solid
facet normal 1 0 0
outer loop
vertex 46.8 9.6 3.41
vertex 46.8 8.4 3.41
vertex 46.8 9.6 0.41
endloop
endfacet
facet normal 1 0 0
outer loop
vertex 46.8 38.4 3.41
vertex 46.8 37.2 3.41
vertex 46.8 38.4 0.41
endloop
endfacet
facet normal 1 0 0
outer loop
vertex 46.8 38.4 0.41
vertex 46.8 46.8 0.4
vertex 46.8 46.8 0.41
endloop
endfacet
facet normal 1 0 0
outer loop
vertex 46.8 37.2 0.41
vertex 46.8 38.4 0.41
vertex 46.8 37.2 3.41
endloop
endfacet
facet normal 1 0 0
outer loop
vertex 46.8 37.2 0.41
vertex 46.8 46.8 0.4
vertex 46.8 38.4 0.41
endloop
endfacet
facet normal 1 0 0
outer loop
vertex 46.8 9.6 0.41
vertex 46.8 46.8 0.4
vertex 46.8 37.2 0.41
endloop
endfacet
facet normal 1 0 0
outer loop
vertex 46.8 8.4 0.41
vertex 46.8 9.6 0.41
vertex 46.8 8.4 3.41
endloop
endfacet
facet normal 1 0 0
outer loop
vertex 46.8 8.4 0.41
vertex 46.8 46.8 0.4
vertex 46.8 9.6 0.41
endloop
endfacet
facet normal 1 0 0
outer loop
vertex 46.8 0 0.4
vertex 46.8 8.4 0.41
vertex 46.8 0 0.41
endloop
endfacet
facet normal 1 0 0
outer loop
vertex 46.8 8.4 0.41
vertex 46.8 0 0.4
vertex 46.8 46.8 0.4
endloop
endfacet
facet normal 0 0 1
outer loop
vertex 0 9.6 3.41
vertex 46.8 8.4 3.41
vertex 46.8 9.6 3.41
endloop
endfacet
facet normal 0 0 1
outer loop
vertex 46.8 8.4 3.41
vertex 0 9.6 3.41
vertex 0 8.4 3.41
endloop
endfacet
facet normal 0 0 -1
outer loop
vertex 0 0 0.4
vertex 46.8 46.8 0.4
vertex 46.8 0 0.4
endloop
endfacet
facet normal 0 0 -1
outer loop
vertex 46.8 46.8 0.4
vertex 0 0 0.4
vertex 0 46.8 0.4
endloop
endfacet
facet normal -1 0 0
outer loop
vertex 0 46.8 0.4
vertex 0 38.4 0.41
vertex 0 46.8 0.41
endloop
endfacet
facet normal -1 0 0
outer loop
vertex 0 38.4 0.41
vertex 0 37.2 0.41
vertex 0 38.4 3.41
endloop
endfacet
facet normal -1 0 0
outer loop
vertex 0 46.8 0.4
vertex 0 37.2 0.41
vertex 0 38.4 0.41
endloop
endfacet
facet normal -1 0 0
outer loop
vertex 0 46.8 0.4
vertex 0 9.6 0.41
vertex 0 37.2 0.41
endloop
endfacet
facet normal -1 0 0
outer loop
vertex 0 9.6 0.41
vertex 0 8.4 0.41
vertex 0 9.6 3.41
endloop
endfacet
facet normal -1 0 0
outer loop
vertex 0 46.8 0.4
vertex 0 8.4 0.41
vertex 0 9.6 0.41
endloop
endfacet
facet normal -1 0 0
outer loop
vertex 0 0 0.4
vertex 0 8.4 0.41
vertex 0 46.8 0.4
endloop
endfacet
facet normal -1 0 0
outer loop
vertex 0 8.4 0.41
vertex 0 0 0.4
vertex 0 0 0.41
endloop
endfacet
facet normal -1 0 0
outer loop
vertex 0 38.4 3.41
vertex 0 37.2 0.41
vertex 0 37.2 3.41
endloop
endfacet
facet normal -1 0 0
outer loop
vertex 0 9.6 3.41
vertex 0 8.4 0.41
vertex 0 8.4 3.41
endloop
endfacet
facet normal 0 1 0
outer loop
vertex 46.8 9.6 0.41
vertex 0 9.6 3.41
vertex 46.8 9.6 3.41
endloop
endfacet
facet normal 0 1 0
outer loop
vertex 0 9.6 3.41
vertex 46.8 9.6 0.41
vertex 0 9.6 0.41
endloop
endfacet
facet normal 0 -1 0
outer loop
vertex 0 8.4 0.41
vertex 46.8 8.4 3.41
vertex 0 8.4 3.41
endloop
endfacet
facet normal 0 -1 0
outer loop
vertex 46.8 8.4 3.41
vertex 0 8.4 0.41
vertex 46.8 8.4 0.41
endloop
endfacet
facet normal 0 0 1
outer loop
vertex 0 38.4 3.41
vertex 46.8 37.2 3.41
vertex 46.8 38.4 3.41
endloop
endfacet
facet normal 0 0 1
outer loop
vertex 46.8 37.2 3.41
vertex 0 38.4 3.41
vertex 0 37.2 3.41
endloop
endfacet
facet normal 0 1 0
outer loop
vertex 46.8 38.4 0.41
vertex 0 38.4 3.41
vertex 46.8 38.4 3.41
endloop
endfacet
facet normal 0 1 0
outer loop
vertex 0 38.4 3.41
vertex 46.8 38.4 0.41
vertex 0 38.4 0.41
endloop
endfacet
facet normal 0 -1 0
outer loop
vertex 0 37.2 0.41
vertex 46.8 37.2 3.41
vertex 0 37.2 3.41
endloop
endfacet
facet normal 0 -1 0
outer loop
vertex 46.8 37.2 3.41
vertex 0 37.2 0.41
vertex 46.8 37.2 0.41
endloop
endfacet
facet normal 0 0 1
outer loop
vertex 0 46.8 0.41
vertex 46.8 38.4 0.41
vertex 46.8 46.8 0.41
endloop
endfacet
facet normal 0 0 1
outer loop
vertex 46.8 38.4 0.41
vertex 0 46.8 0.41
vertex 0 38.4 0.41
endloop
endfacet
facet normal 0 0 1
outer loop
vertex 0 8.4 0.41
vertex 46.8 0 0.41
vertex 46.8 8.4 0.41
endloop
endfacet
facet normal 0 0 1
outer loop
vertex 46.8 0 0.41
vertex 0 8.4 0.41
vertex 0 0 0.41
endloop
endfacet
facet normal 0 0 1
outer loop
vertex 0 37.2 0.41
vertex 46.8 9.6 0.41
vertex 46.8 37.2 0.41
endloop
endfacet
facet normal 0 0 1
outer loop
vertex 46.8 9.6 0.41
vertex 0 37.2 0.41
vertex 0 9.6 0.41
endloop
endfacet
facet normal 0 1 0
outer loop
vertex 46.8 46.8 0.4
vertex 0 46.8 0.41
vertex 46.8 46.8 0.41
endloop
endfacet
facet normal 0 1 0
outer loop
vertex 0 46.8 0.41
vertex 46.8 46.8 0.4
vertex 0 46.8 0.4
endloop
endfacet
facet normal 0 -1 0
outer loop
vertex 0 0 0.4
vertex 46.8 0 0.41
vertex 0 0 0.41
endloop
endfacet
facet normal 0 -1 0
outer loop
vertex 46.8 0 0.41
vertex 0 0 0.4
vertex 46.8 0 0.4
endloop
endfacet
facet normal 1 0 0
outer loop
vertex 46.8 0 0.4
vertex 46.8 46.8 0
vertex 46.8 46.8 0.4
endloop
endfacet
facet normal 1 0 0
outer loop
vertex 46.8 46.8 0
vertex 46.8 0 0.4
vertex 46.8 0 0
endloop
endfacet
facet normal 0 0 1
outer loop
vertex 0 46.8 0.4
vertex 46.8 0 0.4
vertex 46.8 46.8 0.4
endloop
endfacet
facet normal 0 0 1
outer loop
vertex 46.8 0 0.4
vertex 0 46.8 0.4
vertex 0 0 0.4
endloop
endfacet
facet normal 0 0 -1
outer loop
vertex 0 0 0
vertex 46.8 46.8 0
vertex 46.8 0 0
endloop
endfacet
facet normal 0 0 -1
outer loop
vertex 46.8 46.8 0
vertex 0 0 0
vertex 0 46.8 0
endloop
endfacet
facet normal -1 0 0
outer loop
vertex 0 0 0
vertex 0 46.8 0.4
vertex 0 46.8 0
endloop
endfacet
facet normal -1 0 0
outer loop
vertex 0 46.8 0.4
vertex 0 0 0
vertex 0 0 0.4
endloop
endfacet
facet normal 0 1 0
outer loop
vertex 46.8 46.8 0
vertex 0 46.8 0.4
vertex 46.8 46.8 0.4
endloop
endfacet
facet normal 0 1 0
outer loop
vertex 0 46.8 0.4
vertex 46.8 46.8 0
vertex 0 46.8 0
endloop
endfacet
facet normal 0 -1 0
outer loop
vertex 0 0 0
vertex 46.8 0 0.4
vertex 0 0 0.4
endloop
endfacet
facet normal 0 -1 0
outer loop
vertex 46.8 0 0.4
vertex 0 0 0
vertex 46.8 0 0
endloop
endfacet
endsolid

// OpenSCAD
// file: ../../Base/Helper.scad
// Fischertechnik Box Foundation
// Helper functions

include <PlacementOptions.scad>

// getRotation(rotations, i)
// gets the rotation with index i, even if rotations or rotations[i] is undefined.
// If undefined, NoRotation ist returned.
// rotations = list of Rotate-constants
// i = Index of the rotation
function getRotation(rotations, i) = (is_undef(rotations) || is_undef(rotations[i])) ? NoRotation : rotations[i];
// file: ../../Base/PlacementOptions.scad
// Fischertechnik Box Foundation
// Placement Options

// Alignment
NoAlign = 0;
AlignLeft = 1;
AlignBottom = 2;
AlignCenter = 3;
AlignRight = 4;
AlignTop = 5;

// Element rotation degree steps
rotations = [0, -90, -180, -270];

// Rotation
NoRotation = 0;
Rotate0 = 0;
Rotate90 = 1;
Rotate180 = 2;
Rotate270 = 3;

// Docking (seen from above)
NoDock = -1;
DockLeft = 0;
DockTop = 1;
DockRight = 2;
DockCorner = 2;
DockBottom = 3;

// Web corners
LowerLeft = 0;
UpperLeft = 1;
UpperRight = 2;
LowerRight = 3;

// Web position relative to corner
LeftOfCorner = 0;
RightOfCorner = 1;
// file: ../../Base/Boxes.scad
// Fischertechnik Box Foundation
// Pre-designed Boxes

use <Constants.scad>

include <PlacementOptions.scad>

box190Width = 190;
box190Depth = 130;
box130Width = 130;
box130Depth = 95;

// Values are from an original ec3 box
topBottomDifference = 1.5;
outerHeight = 40;
innerHeight = 38.2;
baseThickness = outerHeight - innerHeight;
stackExcess = 5.7;
radius = 3.5;
wallThickness = 1.5;
tolerance = 0.2;
stackOffset = innerHeight - stackExcess;

boxUsageHeight = stackOffset;
boxWallThickness = wallThickness;
boxBaseThickness = baseThickness;
boxWebWidth = 3.0;

// getBoxWallThickness()
// Gets the wall thickness of a Fischertechnik Box
function getBoxWallThickness() = boxWallThickness;

// getBoxUsageHeight()
// Gets the usable height of a Fischertechnik box
function getBoxUsageHeight() = boxUsageHeight;

// getBoxInnerHeight()
// Gets the inner height of a Fischertechnik box, including the stack excess
function getBoxInnerHeight() = innerHeight;

// getBoxBaseThickness()
// Gets the thickness of the Fischertechnik box base.
function getBoxBaseThickness() = boxBaseThickness;

// getBoxWebWidth()
// Gets the width of a box web
function getBoxWebWidth() = boxWebWidth;

// getBox190Space()
// Gets the usable inner space of a Box 190 as an x/y-list
function getBox190Space() = [
    box190Width - 2*getBoxWallThickness() - topBottomDifference, 
    box190Depth - 2*getBoxWallThickness() - topBottomDifference ];

// BoxBase(width, depth)
// Creates an empty stackable Fischertechnik compatible box
// width = Outer width of the box (190, 130, ...)
// depth = Outer depth of the box (130, 95, ...)

module BoxBase(width, depth, height=outerHeight) {    
    thinPlate = 0.01;

    innerHeight = height - baseThickness;    
    
    module BodyPlate(width, depth) {
        translate([radius, radius])
        hull() {
            w = width-2*radius;
            d = depth-2*radius;
            cube([w, d, thinPlate]);
            cylinder(thinPlate, r=radius, $fn=getFragments());
            translate([w, 0])
                cylinder(thinPlate, r=radius, $fn=getFragments());
            translate([w, d])
                cylinder(thinPlate, r=radius, $fn=getFragments());
            translate([0, d])
                cylinder(thinPlate, r=radius, $fn=getFragments());
        }
    }
    
    module Body(tolerance=tolerance) {
        hull() {
            // Bottom with tolerance to fit into the original boxes when stacked
            translate([-wallThickness+tolerance, -wallThickness+tolerance, -baseThickness])
                BodyPlate(width-topBottomDifference-2*tolerance, depth-topBottomDifference-2*tolerance);
            
            // Top
            translate([-wallThickness-topBottomDifference/2, -wallThickness-topBottomDifference/2, innerHeight-thinPlate])
                BodyPlate(width, depth);
         }
    }

    module Cutoff() {
        hull() {
            coWidth = width - 2*wallThickness;
            coDepth = depth - 2*wallThickness;
            
            // Bottom
            BodyPlate(coWidth-topBottomDifference, coDepth-topBottomDifference);

            // Top
            translate([-topBottomDifference/2, -topBottomDifference/2, innerHeight+thinPlate]) 
                BodyPlate(coWidth, coDepth);
        }
    }
    
    difference() {        
        Body();
        Cutoff();
        stackOffset = innerHeight - stackExcess;
        translate([0, 0, stackOffset + baseThickness])
            Body(tolerance=0);
    }
}

// Creates the Fischertechnik empty box 130x190 mm and places it at position 0,0
// 190x130 are the outer sizes, the inner space is slightly smaller. Use getBox190Space() to get the inner sizes.
// The box is positioned that the usable inner space is at the 0,0,0 position. The

module Box190() {
    BoxBase(box190Width, box190Depth);
}

// Gets the usable inner space of a Box 130 as an x/y-list
function getBox130Space() = [
    box130Width - 2*getBoxWallThickness() - topBottomDifference, 
    box130Depth - 2*getBoxWallThickness() - topBottomDifference ];

// Creates the Fischertechnik empty box 95x130 mm and places it at position 0,0
// 190x130 are the outer sizes, the inner space is slightly smaller. Use getBox190Space() to get the inner sizes.
// The box is positioned that the usable inner space is at the 0,0,0 position. The

module Box130() {
    BoxBase(box130Width, box130Depth);
}

// Creates a web at the specified box walls
// corner 0 = LowerLeft, 1 = UpperLeft, 2 = UpperRight, 3 = LowerRight
// side 0 = LeftOfCorner, 1 = RightOfCorner
// distance = Distance in mm from the corner
// boxSpace = inner width and depth of the box (default: Box 190)
// webWidth = length of the web (default is 3 mms)
// webThickness = thickness of the web (default is 1 mm)

module BoxWeb(corner, side, distance, boxSpace=getBox190Space(), webWidth=getBoxWebWidth(), webThickness=1.0) {
    sink = getBoxWallThickness()/2;

    width = (corner % 2 == 0) ? 
            (side == LeftOfCorner ? webWidth : webThickness) :
            (side == LeftOfCorner ? webThickness : webWidth);

    depth = (corner % 2 == 0) ? 
            (side == RightOfCorner ? webWidth : webThickness) :
            (side == RightOfCorner ? webThickness : webWidth);
    
    xDiff = corner == LowerLeft ? 
                (side == LeftOfCorner ? -sink : distance) :
            (corner == UpperLeft ?                
                (side == LeftOfCorner ? distance : -sink) :
            (corner == UpperRight ?
                (side == LeftOfCorner ? boxSpace.x-webWidth+sink : boxSpace.x-distance-webThickness) :
                (side == LeftOfCorner ? boxSpace.x-distance-webThickness: boxSpace.x-webWidth+sink)));

    yDiff = corner == LowerLeft ? 
                (side == RightOfCorner ? -sink : distance) :
            (corner == UpperLeft ?
                (side == RightOfCorner ? boxSpace.y-distance : boxSpace.y-webWidth+sink) :
            (corner == UpperRight ?
                (side == RightOfCorner ? boxSpace.y-webWidth+sink : boxSpace.y-distance) :
                (side == RightOfCorner ? distance : -sink)));
    
    translate([xDiff, yDiff, -getExcess()])
        cube([width, depth, boxUsageHeight + 2*getExcess()]);
}
// file: ../../Base/Rotation.scad
// Fischertechnik Box Foundation
// Geometry Helpers Rotation

include <PlacementOptions.scad>

// getRotatedSpace(space, rotation=NoRotation)
// Rotates the space dependent on the specified rotation

function getRotatedSpace(space, rotation=NoRotation) = [
    (rotation == Rotate90 || rotation == Rotate270) ? space.y : space.x,
    (rotation == Rotate90 || rotation == Rotate270) ? space.x : space.y
];

// Rotates the given space around the fixed left lower corner
// space = the space the children needs as width/depth list [width,depth]
// rotation = 0 Rotate0 degrees, 1 Rotate90 degrees, 2 Rotate180 degrees, 3 Rotate270 degrees (equivalent to -90)

module RotateFix(space, rotation=NoRotation) {
    dy = (rotation == Rotate0 || rotation == Rotate270) ? 0 :
        (rotation == Rotate90) ? space.x :
        space.y;
    dx = (rotation < Rotate180) ? 0 :
        (rotation == Rotate180) ? space.x :
        space.y;
    
    translate([dx, dy, 0])
        rotate([0, 0, rotations[rotation]])
            children();
}
// file: ../../Base/Alignment.scad
// Fischertechnik Box Foundation
// Geometry Helpers Alignment

include <PlacementOptions.scad>

// getAlignedX(elementWidth, spaceWidth, align=AlignRight, offset=0)
// Gets the aligned X offset of an element with the given
// width in the given space.
// elementWidth = The width of the element to positon
// spaceWidth = The space where the element should be aligned
// align = 0 AlignLeft, 1 AlignCenter, 2 AlignRight
// offset = an optional offset from the aligned position. When
// aligned left or centered, then positive values are in X direction.
// When aligned right then positive values are in negative X direction.

function getAlignedX(elementWidth, spaceWidth, align=AlignRight, offset=0) =
    (align == AlignLeft) ?
        offset :
        ((align == AlignCenter) ?
        (spaceWidth - elementWidth)/2 + offset :
        spaceWidth - offset - elementWidth);

// getAlignedY(elementDepth, spaceDepth, align=AlignTop, offset=0)
// Gets the aligned Y offset of an element with the given
// depth in the given space.
// elementDepth = The depth of the element to positon
// spaceDepth = The space where the element should be aligned
// align = 0 AlignBottom, 1 AlignCenter, 2 AlignTop
// offset = an optional offset from the aligned position. When
// aligned bottom or centered, then positive values are in Y direction.
// When aligned top then positive values are in negative Y direction.

function getAlignedY(elementDepth, spaceDepth, align=AlignTop, offset=0) =
    (align == AlignBottom) ?
        offset :
        ((align == AlignCenter) ?
        (spaceDepth - elementDepth)/2 + offset :
        spaceDepth - offset - elementDepth);
// file: ../../Base/Placement.scad
// Fischertechnik Box Foundation
// Geometry Helpers Placement

use <Constants.scad>
use <Alignment.scad>
use <Rotation.scad>
use <Boxes.scad>

include <PlacementOptions.scad>

// Place(x=0, y=0, elementSpace=[0,0], alignX=AlignLeft, alignY=AlignBottom, rotation=Rotate0, boxSpace=getBox190Space())
// Places the child at the specified position
// y = Y-Position. This is a relative position when an X aligment is specified.
// x = X-Position. This is a relative position when an Y aligment is specified.
// elementSpace = space of the element to be placed [x,y]
// alignX = -1=NoAlign, 0 AlignLeft, 1 AlignCenter, 3 AlignRight (elementSpace and boxSpace required!)
// alignY = -1=NoAlign, 2 AlignBottom, 1 AlignCenter, 4 AlignTop (elementSpace and boxSpace required!)
// rotation = 0 Rotate0 0 degrees, 1 Rotate90 90 degrees, 
// 2 Rotate180 180 degrees, 3 Rotate270 270 degrees (equivalent to -90)
// boxSpace = Inner space of the box where the placement occurs [x,y] - default is Box 190x130 inner space

module Place(x=0, y=0, elementSpace=[0,0], 
  alignX=AlignLeft, alignY=AlignBottom, 
  rotation=NoRotation, boxSpace=getBox190Space()) {

    module Position(x, y, space, rotation=Rotate0) {
        translate([x, y, 0])
            RotateFix(space, rotation)
                children();
    }

    space = getRotatedSpace(elementSpace, rotation);
    alignedX = getAlignedX(space.x, boxSpace.x, alignX, x);
    alignedY = getAlignedY(space.y, boxSpace.y, alignY, y);
    Position(alignedX, alignedY, elementSpace, rotation)
        children();
}

// Center(space=getBox130Space(), elementSpace=[0,0])
// space = Space where the children is centered. For cylinder use centered=true and no elementSpace.
// elementSpace = space of the element to be centered [x,y]

module Center(space=getBox190Space(), elementSpace=[0,0]) {
    Place(elementSpace=elementSpace, boxSpace=space, alignX=AlignCenter, alignY=AlignCenter)
        children();
}

// CenterHorizontal(width=0, y=0, offset=0, space=getBox130Space())
// width = Width of the element to be placed.
// y = Y position of the element
// offset = Offset from the center position (negative will be left of the center)
// space = Space where the element is placed

module CenterHorizontal(width=0, y=0, offset=0, space=getBox190Space()) {
    Place(x=offset, y=y, elementSpace=[width, 0], boxSpace=space, alignX=AlignCenter)
        children(0);
}

// CenterVertical(depth=0, x=0, offset=0, space=getBox130Space())
// depth = Depth of the element to be placed.
// x = X position of the element
// offset = Offset from the center position (negative will be down of the center)
// space = Space where the element is placed

module CenterVertical(depth=0, x=0, offset=0, space=getBox190Space()) {
    Place(x=x, y=offset, elementSpace=[0, depth], boxSpace=space, alignY=AlignCenter)
        children(0);
}

// getIsVertical(align)
// True if the specified alignment needs a vertical orientation for a divider (AlignRight, AlignLeft)

function getIsVertical(align) = (align == AlignRight || align == AlignLeft);

// getIsHorizontal(align)
// True if the specified alignment needs a horizontal orientation for a divider (AlignTop, AlignBottom)

function getIsHorizontal(align) = (align == AlignTop || align == AlignBottom);
// file: ../../Elements/AxisClip10.scad
// Fischertechnik Box Library
// Axis for clip 10
// 31023

use <../ModelBase/Simple.scad>
use <../Base/Constants.scad>

/* [Element Parameters] */
height = 23;
clipHeight = 10;

/* [Hidden] */
width = 12;
depth = 12;
upperDiameter = 3.6;

// getAxisClip10Space()
// Gets the space of a frame for a clip 10 with spring ring (mot2)

function getAxisClip10Space() = [width, depth, height];

// AxisClip10(height, clipHeight)
// Axis for clip 10 with spring ring (mot2)
// height = Height of the complete axis (standard is 23, in mot3 its only 12)
// clipHeight = Height of the part for the clip (standard is 10, in mot3 its only 7)

module AxisClip10(height=height, clipHeight=clipHeight) {
    LeveledAxisWithSpace(height, height-clipHeight, getAxisClip10Space(), diameter=upperDiameter);
}

// Test
color("lightgray")
AxisClip10(height, clipHeight);
// file: ../../Base/Constants.scad
// Fischertechnik Box Foundation
// Constants

// Constant values necessary for multiple elements

// Base constants
dividerThickness = 1.2;
excess = 0.01;
fragments = 90;
tolerance = 0.8;

// Gets the thickness of a divider 
function getDividerThickness() = dividerThickness;

// Gets the excess that is used to merge walls into each other
function getExcess() = excess;

// Gets amount of fragments of a cylinder
function getFragments() = fragments;

// Gets the inner tolerance of a frame to each side
function getTolerance() = tolerance;


// Fischertechnik specific constants
axisDiameter = 4;
axisBottomDiameter = axisDiameter + 1;
axisTolerance = 0.2;
standardEdgeDistance = 2.5;
standardWebDistance = 11.5;
standardCornerLength = 15;
tubeWallFactor = 0.8;
smallPartsFrameHeight = 20;

// Gets axis diameter of Fischertechnik axis
function getAxisDiameter() = axisDiameter;

// Gets axis diameter tolerance (subtracted for element axis)
function getAxisTolerance() = axisTolerance;

// Gets the axis diameter for standing axis
function getStandAxisDiameter() = getAxisDiameter() - getAxisTolerance();

// Gets axis bottom diameter for thicker part at the bottom
function getAxisBottomDiameter() = axisBottomDiameter;

// gets the standard distance to the wall of the box for dockable frames with webs
function getStandardEdgeDistance() = standardEdgeDistance;

// gets the standard distance of each web to the corner of the dockable frame
function getStandardWebDistance() = standardWebDistance;

// gets the standard length of the corner walls of a dockable frame
function getStandardCornerLength() = standardCornerLength;

// gets the wall thickness of a tube.
function getTubeWallThickness() = tubeWallFactor * getDividerThickness();

// gets the frame height for docked small parts boxes.
function getSmallPartsFrameHeight() = smallPartsFrameHeight;
// file: ../../Elements/HolderTire45.scad
// Fischertechnik Box Library
// Holder for Tire 45 (may be with flat hub)
// 31018, (31015)

use <../Base/Constants.scad>
use <../Base/Placement.scad>
use <../Base/Deployment.scad>
use <../ModelBase/Simple.scad>

/* [Element Parameters] */
count = 1;
height = 3; // [3, 6]

/* [Hidden] */
width = 46;
depth = 46;

// getHolderTire45Space(count=1)
// Gets the space the tire 45 holder needs as width and depth (.x and .y as a list)

function getHolderTire45Space(count=1, height=height) = [(width * count) + getTolerance(), depth + getTolerance(), height];

// HolderTire45(count=1)
// Tire 45 holder
// count = Count of tires in a row

module HolderTire45(count=1, height=height) {
    distance = 30;

    wallVolume = [
        getHolderTire45Space(count).x, 
        getDividerThickness(),
        height];

    webSpace = [
        wallVolume.x,
        distance
    ];

    Space(getHolderTire45Space(count));

    CenterVertical(distance, space=getHolderTire45Space(count))
    DeployVertical(distance, [wallVolume, wallVolume]) {
        Wall(wallVolume);
        Wall(wallVolume);
    }
}

// Test
color("lightgray")
HolderTire45(count, height);
// file: ../TestPrint.scad
// 3D Print Test Base

use <../Base/Constants.scad>

use <../Elements/AxisClip10.scad>

module TestPrint(elementSpace) {
    cube([elementSpace.x, elementSpace.y, 0.4]);
    translate([0,0,0.4+getExcess()]) {
        children();
    }
}

TestPrint(getAxisClip10Space())
    AxisClip10();
// main file
// 3D Print Test
// HolderTire45

use <../TestPrint.scad>
use <../../Elements/HolderTire45.scad>

count = 1;

TestPrint(getHolderTire45Space(count))
    HolderTire45(count);
